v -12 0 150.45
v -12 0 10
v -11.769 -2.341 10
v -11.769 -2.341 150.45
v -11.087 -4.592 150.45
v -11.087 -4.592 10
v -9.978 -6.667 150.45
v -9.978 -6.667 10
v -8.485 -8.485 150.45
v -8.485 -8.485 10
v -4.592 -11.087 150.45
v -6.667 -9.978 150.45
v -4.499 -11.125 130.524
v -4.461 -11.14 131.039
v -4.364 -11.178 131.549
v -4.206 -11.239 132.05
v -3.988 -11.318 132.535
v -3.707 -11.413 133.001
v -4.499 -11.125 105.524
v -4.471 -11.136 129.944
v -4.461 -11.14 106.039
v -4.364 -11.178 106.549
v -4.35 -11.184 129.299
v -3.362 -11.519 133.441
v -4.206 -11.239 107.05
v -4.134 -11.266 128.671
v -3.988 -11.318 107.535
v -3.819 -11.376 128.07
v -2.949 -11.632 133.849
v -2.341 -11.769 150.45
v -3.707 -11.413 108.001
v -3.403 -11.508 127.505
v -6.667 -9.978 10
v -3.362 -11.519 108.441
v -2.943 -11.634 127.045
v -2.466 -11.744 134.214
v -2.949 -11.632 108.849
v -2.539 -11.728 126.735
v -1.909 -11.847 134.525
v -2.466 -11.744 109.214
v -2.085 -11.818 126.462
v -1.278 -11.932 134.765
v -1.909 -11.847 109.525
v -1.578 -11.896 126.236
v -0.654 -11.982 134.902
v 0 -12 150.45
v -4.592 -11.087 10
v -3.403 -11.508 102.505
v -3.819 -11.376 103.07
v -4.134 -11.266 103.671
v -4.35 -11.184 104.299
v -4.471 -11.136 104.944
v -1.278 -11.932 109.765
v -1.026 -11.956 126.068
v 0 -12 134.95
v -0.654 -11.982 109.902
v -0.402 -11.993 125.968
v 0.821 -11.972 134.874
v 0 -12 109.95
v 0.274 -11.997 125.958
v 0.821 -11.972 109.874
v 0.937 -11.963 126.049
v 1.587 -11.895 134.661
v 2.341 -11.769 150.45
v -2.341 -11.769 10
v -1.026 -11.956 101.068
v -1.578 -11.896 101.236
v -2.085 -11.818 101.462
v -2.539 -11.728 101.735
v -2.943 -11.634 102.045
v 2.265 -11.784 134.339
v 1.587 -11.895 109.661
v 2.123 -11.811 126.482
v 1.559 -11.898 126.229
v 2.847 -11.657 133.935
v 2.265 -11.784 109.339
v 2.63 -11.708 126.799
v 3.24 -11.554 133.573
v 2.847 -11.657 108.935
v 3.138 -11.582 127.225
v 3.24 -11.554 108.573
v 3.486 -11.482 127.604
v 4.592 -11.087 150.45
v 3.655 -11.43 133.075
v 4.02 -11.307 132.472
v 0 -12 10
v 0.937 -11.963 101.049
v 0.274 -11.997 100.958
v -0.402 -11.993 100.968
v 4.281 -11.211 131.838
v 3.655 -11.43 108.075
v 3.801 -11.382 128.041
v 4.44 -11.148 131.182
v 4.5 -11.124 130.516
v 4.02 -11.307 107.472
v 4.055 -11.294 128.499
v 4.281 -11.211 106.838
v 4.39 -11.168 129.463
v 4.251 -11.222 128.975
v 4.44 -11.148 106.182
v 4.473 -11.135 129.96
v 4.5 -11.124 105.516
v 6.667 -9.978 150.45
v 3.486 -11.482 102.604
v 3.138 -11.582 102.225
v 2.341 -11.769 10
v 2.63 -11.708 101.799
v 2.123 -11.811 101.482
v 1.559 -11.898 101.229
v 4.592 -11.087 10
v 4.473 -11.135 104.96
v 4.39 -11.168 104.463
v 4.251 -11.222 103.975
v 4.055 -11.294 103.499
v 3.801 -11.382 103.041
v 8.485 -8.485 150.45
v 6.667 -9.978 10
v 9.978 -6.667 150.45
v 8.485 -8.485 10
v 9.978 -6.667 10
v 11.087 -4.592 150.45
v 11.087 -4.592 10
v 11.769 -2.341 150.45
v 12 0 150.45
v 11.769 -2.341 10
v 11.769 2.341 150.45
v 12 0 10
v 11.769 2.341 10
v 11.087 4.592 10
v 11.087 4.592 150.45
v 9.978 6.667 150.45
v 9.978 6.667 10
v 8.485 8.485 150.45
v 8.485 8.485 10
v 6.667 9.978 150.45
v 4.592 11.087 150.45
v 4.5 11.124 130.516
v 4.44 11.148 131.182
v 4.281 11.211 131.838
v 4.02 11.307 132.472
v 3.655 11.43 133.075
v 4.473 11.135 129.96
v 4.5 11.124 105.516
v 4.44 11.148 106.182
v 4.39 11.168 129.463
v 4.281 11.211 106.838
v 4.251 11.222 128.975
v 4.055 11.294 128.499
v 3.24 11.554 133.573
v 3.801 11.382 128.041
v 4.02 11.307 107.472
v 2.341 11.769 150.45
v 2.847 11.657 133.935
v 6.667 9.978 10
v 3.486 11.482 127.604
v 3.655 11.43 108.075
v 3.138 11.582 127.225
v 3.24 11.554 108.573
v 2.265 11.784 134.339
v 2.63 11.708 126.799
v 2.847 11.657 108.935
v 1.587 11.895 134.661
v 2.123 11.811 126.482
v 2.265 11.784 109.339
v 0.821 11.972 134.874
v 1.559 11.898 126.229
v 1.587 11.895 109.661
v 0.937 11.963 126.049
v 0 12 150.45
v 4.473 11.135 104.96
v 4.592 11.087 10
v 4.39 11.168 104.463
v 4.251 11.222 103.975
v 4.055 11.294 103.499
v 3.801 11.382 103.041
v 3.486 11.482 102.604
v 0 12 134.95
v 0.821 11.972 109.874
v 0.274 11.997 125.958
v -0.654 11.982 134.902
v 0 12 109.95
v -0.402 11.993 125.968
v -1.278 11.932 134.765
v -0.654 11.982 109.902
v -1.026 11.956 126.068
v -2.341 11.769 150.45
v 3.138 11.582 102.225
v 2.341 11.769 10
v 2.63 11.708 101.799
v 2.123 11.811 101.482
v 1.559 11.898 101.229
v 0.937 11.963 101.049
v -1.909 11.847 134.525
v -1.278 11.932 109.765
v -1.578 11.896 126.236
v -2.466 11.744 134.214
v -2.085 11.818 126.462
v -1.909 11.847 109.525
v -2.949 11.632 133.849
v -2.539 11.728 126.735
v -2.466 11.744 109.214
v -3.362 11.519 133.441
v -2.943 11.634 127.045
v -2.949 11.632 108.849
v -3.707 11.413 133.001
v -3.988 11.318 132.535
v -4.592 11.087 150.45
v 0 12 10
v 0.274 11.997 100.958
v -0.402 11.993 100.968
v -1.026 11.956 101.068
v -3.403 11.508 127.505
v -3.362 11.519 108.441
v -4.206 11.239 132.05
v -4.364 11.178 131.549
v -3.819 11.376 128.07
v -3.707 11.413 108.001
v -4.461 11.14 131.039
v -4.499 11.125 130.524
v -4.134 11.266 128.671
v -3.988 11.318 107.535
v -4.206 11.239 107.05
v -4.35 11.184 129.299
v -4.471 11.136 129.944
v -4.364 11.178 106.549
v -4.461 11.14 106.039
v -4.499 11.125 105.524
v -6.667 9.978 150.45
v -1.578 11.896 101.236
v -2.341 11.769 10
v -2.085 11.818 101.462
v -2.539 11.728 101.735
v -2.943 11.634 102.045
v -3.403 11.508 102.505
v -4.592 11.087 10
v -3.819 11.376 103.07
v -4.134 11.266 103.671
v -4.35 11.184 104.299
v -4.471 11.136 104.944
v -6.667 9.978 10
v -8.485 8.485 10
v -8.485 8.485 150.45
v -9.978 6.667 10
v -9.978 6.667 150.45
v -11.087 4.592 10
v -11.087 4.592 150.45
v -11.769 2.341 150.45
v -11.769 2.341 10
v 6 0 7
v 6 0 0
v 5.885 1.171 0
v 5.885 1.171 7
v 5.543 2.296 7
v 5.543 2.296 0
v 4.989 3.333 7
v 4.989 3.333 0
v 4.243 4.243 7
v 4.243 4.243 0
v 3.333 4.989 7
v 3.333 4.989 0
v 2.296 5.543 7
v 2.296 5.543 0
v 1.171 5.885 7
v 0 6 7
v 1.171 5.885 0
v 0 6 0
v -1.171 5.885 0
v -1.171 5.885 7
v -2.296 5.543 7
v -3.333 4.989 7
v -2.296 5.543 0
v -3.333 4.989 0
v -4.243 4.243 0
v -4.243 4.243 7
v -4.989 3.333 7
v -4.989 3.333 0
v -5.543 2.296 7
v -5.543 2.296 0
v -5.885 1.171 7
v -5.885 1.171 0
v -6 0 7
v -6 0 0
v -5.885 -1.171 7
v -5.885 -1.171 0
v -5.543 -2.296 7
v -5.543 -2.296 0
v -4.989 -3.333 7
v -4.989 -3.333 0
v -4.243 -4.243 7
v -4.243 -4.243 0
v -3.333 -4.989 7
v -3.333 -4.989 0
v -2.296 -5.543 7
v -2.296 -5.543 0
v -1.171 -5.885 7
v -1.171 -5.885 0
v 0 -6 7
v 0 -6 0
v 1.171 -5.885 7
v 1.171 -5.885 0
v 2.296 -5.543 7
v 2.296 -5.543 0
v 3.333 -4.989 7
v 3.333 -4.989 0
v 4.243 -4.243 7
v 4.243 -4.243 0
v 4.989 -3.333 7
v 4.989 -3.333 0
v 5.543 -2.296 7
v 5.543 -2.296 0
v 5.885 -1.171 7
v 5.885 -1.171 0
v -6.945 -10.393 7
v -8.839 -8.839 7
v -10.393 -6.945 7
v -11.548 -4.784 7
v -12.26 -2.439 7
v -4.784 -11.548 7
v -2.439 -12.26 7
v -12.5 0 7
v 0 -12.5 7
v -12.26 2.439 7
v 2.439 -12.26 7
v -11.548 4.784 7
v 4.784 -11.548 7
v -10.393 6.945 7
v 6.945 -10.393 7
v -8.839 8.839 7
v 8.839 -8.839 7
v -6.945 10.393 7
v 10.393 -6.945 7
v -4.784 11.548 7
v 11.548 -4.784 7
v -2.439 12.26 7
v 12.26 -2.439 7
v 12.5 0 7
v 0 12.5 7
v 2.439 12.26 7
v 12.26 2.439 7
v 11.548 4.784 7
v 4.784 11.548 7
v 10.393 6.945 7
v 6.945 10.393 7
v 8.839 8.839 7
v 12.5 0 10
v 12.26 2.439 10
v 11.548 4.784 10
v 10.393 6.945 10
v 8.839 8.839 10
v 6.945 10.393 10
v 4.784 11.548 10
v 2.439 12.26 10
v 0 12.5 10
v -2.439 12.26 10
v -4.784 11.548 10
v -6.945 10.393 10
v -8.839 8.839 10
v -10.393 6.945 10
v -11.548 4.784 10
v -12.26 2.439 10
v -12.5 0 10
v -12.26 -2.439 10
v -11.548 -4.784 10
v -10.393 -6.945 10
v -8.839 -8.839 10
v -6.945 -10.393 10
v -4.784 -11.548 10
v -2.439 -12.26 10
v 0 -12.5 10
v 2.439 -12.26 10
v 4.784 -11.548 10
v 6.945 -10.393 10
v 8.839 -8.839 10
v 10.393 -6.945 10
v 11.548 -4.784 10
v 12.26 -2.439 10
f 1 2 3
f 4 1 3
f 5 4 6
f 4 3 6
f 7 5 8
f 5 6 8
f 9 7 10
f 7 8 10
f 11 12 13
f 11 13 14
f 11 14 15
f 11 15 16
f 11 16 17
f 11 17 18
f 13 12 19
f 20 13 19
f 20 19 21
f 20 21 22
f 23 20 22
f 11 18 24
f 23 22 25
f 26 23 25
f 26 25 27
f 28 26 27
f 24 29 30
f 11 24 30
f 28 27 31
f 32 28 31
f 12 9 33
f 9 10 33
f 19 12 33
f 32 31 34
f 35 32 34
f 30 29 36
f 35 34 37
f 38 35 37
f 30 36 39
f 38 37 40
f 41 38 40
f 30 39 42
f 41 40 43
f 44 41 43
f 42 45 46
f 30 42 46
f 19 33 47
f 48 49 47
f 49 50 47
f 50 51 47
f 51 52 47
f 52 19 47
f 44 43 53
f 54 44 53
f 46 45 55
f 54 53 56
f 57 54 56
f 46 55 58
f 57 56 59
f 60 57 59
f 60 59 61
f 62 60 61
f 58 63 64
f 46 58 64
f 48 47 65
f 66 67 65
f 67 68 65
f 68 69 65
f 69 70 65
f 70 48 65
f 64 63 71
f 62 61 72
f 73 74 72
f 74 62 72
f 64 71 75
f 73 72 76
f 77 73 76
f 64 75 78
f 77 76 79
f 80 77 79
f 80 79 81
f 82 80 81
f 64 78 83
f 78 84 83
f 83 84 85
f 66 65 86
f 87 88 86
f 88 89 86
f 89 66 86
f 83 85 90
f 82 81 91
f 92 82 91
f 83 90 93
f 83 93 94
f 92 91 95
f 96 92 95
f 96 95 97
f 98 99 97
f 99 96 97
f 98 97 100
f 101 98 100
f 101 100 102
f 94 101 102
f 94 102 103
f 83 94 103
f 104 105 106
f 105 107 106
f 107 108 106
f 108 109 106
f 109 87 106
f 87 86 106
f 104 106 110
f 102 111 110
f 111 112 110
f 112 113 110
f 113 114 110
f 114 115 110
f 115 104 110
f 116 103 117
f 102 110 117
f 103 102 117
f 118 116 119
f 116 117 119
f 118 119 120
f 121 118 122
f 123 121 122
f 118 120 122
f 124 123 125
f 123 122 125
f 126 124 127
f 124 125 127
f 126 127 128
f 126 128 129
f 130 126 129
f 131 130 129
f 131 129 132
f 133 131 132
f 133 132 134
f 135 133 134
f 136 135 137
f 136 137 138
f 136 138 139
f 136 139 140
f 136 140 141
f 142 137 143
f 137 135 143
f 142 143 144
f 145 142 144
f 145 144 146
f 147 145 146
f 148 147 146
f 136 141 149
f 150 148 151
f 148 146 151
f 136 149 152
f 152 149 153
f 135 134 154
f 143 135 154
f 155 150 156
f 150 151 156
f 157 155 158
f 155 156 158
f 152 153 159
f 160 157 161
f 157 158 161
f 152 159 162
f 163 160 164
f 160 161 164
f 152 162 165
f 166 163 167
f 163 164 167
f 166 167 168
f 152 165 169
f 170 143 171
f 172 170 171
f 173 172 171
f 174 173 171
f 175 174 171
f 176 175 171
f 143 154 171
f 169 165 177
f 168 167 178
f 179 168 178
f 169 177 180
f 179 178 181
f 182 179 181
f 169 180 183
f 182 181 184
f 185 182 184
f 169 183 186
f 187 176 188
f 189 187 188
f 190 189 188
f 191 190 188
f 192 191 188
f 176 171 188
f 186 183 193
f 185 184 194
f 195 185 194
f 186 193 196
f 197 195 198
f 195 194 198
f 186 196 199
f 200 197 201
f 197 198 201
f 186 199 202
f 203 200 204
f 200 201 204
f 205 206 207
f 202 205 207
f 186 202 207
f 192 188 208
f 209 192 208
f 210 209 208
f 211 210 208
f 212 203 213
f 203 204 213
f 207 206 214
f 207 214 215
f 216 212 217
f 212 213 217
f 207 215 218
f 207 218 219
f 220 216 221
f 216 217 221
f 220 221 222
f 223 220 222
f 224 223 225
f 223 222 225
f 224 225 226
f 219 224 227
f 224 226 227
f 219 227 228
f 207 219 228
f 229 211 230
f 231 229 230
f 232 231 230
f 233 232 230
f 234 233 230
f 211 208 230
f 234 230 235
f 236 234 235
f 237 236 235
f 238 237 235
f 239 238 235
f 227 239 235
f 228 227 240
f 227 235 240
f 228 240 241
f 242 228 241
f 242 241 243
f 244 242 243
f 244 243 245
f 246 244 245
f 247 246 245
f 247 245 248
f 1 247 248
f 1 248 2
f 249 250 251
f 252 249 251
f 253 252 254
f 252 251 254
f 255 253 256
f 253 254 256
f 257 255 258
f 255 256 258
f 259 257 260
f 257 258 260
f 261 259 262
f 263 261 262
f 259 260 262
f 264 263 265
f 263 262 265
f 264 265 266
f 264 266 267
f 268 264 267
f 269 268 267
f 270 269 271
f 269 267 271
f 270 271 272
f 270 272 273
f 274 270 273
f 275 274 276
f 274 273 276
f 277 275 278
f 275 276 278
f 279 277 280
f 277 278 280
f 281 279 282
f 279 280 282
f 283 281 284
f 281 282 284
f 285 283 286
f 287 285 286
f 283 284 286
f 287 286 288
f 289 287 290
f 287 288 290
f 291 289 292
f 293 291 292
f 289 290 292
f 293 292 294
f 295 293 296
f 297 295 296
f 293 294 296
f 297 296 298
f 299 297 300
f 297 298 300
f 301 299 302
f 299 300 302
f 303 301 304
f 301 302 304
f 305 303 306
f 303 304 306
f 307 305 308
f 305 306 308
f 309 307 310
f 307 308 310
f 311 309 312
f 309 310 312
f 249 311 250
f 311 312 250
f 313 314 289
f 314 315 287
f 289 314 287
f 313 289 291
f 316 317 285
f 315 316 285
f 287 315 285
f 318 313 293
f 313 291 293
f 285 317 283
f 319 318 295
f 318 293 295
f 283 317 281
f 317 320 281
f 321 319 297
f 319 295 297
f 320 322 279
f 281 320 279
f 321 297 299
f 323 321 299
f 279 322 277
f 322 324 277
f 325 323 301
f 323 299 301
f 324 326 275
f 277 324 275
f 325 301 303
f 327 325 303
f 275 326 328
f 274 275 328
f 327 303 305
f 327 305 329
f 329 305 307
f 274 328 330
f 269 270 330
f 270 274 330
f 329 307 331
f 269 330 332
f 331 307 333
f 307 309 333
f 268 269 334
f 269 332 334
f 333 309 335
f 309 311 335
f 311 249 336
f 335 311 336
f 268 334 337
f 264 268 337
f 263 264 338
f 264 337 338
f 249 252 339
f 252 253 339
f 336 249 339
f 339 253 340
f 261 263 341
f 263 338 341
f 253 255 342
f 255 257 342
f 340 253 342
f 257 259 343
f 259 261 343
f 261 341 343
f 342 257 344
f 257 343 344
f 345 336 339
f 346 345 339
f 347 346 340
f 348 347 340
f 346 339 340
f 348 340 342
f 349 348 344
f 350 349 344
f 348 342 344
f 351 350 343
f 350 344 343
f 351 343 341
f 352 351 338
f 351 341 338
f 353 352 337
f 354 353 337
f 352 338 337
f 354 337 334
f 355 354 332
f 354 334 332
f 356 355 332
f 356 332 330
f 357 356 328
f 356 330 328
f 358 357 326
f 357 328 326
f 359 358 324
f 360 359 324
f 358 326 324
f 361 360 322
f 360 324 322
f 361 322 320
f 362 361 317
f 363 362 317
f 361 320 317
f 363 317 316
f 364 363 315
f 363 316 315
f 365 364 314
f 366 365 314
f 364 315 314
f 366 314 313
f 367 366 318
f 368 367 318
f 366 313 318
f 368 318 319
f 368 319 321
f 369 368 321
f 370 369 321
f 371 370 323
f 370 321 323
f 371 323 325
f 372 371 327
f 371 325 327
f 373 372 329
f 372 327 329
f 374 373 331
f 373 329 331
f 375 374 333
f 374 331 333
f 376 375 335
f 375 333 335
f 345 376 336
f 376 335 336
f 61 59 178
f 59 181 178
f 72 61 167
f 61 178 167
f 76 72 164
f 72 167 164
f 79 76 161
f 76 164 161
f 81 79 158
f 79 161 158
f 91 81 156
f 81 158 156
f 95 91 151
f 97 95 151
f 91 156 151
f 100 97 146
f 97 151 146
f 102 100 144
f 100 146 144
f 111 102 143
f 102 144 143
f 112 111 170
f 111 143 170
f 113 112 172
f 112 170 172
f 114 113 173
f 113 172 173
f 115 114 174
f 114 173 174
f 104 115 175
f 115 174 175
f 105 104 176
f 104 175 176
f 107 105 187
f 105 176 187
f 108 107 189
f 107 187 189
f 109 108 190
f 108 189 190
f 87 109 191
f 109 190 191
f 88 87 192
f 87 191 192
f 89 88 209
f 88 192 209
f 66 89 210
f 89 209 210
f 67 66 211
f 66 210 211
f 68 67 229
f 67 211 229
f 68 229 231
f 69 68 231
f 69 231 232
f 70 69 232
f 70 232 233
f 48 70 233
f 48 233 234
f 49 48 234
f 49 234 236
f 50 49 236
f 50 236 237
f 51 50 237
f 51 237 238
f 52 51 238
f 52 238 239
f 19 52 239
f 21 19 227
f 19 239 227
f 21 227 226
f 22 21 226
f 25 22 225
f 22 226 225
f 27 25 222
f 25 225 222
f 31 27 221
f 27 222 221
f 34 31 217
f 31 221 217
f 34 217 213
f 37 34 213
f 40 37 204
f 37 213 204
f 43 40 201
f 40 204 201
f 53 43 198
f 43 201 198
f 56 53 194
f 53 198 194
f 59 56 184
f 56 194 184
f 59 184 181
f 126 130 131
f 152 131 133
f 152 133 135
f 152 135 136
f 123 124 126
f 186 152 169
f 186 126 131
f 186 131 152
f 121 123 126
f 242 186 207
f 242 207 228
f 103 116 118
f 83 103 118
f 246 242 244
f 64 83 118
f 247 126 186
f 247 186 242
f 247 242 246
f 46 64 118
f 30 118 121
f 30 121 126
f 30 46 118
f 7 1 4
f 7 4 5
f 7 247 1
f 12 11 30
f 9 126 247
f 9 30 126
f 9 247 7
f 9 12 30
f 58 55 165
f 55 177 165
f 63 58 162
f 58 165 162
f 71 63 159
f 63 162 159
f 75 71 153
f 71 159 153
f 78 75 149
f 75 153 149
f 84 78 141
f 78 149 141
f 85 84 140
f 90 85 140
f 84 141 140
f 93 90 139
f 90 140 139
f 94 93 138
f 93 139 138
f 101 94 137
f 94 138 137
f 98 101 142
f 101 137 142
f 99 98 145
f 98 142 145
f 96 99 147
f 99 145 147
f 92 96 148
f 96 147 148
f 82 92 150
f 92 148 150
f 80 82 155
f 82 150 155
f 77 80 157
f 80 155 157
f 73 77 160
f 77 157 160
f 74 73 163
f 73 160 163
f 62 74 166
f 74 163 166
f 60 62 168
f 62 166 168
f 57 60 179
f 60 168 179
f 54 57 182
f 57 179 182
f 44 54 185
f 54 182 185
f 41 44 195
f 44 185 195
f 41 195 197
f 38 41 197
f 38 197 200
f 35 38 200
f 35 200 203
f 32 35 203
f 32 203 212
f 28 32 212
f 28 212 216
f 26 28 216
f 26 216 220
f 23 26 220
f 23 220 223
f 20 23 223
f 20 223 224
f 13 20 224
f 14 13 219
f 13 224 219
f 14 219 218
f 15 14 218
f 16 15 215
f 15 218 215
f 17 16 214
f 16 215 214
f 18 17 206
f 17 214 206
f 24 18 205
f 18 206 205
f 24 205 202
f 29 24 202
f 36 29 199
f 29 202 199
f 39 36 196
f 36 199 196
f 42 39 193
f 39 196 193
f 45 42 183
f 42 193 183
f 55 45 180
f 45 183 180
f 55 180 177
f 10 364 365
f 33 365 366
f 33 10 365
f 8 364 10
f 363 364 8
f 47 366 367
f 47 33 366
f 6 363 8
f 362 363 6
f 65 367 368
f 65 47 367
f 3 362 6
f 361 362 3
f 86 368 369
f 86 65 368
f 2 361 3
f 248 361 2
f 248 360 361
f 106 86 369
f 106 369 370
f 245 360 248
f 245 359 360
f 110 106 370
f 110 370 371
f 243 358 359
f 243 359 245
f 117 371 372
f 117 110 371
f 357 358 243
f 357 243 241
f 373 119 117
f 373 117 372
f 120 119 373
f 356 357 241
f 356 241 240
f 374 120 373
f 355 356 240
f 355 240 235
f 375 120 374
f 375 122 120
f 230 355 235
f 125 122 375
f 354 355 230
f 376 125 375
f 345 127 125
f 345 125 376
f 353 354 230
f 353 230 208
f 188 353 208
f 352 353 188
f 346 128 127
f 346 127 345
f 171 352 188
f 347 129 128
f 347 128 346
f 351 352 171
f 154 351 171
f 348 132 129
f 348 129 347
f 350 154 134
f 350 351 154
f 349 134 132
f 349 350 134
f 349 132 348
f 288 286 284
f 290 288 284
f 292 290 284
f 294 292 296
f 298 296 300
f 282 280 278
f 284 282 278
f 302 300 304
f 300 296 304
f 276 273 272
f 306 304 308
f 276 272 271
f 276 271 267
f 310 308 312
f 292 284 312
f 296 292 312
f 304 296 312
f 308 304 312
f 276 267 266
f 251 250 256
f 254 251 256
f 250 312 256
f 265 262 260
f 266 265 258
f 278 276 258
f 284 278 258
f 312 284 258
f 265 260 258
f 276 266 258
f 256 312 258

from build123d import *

# Parameters (mm, degrees)
SKETCH1_R           = 6
BOSS_EXTRUDE1_DEPTH = 7
SKETCH2_R           = 12.5
BOSS_EXTRUDE2_DEPTH = 3
SKETCH3_R           = 12
BOSS_EXTRUDE3_DEPTH = 140.45
SKETCH4_R           = 4.5
CUT_EXTRUDE1_DEPTH  = 152.484991006
LPATTERN1_COUNT     = 2
LPATTERN1_PITCH     = 25


with BuildPart() as part:
    # Sketch1 → Boss-Extrude1 (new body)
    with BuildSketch(Plane.XY):
        Circle(SKETCH1_R)
    extrude(amount=BOSS_EXTRUDE1_DEPTH)

    # Sketch2 → Boss-Extrude2 (add)
    with BuildSketch(Plane.XY.offset(7)):
        Circle(SKETCH2_R)
    extrude(amount=BOSS_EXTRUDE2_DEPTH)

    # Sketch3 → Boss-Extrude3 (add)
    with BuildSketch(Plane.XY.offset(10)):
        with Locations(Location((0, 0, 0), (0, 0, 180))):
            Circle(SKETCH3_R)
    extrude(amount=BOSS_EXTRUDE3_DEPTH)

    # Sketch4 → Cut-Extrude1 (cut, symmetric)
    with BuildSketch(Plane(origin=(0, 0, 0), x_dir=(1, 0, 0), z_dir=(0, 1, 0))):
        with Locations(Location((0, -130.45, 0), (0, 0, 270))):
            Circle(SKETCH4_R)
    cut_extrude1 = extrude(amount=CUT_EXTRUDE1_DEPTH, both=True, mode=Mode.SUBTRACT)

    # LPattern1: Cut-Extrude1 ×2
    with Locations(*[(0, 0, -i * LPATTERN1_PITCH) for i in range(1, LPATTERN1_COUNT)]):
        add(cut_extrude1, mode=Mode.SUBTRACT)


solid = part.part
